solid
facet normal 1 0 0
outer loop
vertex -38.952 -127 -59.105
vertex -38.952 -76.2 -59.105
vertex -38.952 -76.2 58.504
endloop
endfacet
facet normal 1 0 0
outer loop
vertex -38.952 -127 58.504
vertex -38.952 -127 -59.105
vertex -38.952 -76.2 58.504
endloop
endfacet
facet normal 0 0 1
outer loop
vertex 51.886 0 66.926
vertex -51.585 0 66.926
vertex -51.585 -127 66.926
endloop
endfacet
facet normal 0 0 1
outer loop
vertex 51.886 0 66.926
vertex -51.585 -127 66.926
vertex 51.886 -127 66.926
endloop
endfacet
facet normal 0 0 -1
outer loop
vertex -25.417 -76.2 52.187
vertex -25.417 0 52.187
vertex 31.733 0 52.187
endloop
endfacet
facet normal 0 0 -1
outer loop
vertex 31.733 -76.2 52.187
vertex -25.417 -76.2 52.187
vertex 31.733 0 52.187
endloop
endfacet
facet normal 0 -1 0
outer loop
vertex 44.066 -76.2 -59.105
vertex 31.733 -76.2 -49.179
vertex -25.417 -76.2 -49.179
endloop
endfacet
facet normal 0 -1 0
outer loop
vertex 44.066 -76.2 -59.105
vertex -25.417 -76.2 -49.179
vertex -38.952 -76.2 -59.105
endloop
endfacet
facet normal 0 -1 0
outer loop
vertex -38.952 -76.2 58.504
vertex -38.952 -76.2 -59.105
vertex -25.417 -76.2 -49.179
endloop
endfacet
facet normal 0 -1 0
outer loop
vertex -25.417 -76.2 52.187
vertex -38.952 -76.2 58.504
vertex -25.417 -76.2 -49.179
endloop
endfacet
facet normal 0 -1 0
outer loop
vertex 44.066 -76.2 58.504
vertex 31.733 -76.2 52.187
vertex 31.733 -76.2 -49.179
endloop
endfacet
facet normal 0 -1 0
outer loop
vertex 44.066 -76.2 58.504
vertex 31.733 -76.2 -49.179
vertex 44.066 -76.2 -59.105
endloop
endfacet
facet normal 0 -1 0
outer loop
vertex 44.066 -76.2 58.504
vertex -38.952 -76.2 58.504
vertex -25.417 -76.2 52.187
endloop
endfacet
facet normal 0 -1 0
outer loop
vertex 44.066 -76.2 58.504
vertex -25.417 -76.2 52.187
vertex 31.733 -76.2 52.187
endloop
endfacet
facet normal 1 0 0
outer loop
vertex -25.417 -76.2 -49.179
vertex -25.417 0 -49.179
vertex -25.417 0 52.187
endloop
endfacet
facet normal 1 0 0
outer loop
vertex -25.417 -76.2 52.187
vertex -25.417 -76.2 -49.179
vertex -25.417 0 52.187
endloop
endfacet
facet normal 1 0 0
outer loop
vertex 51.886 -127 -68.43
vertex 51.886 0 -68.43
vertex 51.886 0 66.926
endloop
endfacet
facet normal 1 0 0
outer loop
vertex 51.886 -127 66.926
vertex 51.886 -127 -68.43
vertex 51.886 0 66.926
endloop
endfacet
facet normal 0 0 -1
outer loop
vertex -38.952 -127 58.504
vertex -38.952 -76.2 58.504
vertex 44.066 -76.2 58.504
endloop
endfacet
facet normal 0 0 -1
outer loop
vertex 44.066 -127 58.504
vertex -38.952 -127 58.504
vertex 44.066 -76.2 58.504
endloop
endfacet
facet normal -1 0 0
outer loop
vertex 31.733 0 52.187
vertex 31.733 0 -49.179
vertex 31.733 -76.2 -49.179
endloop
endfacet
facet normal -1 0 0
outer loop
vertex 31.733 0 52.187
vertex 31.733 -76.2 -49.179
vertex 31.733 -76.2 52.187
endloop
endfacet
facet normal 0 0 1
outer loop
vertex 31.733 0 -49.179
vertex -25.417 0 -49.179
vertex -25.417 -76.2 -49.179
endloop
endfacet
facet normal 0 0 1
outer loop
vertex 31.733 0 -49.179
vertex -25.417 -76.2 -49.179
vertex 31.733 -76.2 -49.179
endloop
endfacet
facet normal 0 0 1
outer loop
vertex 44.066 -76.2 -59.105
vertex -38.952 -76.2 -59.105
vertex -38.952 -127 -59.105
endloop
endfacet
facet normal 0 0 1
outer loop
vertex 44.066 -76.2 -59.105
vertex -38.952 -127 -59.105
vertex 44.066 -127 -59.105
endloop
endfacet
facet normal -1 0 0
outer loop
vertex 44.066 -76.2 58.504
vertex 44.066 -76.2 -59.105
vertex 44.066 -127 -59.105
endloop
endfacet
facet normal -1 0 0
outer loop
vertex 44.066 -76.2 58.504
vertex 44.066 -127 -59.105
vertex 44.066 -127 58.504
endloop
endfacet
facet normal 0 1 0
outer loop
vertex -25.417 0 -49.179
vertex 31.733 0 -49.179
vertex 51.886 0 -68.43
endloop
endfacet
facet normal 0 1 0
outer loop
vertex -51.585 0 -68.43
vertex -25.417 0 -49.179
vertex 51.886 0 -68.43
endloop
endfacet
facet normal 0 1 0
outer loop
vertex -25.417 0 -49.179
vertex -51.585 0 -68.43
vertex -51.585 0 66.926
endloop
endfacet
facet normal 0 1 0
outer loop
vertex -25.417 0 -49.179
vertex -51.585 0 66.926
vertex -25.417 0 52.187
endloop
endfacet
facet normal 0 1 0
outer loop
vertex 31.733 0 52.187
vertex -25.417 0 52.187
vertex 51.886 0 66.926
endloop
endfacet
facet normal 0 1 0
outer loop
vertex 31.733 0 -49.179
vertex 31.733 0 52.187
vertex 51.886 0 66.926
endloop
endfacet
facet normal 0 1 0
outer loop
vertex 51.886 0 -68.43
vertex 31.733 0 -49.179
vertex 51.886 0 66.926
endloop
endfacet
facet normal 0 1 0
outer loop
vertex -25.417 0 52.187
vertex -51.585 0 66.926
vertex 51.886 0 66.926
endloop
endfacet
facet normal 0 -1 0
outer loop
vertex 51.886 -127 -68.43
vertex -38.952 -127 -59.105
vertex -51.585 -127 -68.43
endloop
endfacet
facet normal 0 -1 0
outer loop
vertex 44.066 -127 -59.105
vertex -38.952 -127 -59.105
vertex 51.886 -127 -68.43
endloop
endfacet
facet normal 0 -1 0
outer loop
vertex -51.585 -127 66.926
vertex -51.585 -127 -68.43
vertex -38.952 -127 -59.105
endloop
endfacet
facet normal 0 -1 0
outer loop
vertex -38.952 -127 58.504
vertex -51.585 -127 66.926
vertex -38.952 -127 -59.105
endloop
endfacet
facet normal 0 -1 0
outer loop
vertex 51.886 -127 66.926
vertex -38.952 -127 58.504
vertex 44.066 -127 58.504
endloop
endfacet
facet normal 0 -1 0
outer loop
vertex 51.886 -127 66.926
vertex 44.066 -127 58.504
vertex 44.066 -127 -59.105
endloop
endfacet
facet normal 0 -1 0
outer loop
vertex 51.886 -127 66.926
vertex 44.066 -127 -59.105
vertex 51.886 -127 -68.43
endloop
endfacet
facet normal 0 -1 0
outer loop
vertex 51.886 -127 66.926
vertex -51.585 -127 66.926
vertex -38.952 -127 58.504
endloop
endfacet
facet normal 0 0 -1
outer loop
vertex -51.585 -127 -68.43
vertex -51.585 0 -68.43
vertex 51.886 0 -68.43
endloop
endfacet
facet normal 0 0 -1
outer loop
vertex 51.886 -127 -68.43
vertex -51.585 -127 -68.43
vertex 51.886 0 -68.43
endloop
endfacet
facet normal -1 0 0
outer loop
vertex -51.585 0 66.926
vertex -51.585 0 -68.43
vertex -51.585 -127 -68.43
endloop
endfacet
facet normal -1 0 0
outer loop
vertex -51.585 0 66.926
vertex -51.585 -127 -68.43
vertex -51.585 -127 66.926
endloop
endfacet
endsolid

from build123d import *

# Parameters (mm, degrees)
F0_W     = 103.471577
F0_H     = 135.355264
F0_W_2   = 83.017897
F0_H_2   = 117.608685
F1_DEPTH = 127
F0_W_3   = 57.149997
F0_H_3   = 101.366054
F2_DEPTH = 76.2


with BuildPart() as f1:
    # F0 (on Front) → F1 (new body)
    with BuildSketch(Plane.XZ):
        with Locations((0.150393, -0.751972)):
            Rectangle(F0_W, F0_H)
        with Locations((2.55671, -0.30079)):
            Rectangle(F0_W_2, F0_H_2, mode=Mode.SUBTRACT)
    extrude(amount=F1_DEPTH)

    # F0 (on Front) → F2 (join)
    with BuildSketch(Plane.XZ):
        with Locations((2.55671, -0.30079)):
            Rectangle(F0_W_2, F0_H_2)
        with Locations((3.158288, 1.50395)):
            Rectangle(F0_W_3, F0_H_3, mode=Mode.SUBTRACT)
    extrude(amount=F2_DEPTH)


solid = f1.part
